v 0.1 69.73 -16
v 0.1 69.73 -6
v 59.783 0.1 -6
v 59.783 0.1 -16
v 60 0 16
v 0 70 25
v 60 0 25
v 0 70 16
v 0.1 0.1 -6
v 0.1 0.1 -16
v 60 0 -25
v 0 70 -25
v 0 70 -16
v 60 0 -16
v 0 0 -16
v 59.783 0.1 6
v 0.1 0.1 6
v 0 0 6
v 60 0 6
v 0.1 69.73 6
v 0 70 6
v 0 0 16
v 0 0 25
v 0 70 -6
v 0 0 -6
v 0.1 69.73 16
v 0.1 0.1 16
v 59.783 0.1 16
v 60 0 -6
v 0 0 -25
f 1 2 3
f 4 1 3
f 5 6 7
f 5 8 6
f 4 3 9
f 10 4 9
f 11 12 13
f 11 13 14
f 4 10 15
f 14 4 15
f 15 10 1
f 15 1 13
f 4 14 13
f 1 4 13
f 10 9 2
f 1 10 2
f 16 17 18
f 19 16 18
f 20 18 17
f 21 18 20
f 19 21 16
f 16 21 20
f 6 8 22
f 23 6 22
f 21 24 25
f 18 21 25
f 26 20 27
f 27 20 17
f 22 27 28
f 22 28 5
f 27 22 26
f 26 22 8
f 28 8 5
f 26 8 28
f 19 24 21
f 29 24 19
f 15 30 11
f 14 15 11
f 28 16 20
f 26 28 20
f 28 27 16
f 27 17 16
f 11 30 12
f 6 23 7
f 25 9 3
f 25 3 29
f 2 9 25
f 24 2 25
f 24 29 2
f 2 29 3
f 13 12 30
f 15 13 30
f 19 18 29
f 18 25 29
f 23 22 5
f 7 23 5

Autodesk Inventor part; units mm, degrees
ref_plane "YZ Plane" through (0, 0, 0) normal (1, 0, 0) x (0, 1, 0)
ref_plane "XZ Plane" through (0, 0, 0) normal (0, 1, 0) x (-1, 0, 0)
sketch "草圖1" plane through (0, 0, 0) normal (0, 0, 1) x (1, 0, 0)
  line L0 (-12, 0) -> (72, 0) construction
  line L1 (0, -14) -> (0, 84) construction
  line L2 (0, 0) -> (60, 0)
  line L3 (0, 70) -> (0, 0)
  line L4 (0, 70) -> (60, 0)
  dimension "d0" = 60
  dimension "d1" = 70
extrude "擠出1" add sketch "草圖1" along normal mid plane 50
ref_plane "工作平面1" through (0, 0, 2) normal (0, 0, 1) x (1, 0, 0)
ref_plane "工作平面2" through (0, 0, 6) normal (0, 0, 1) x (1, 0, 0)
sketch "草圖3" plane through (0, 0, 6) normal (0, 0, 1) x (1, 0, 0)
  line L0 (0, 0) -> (0, 70) construction
  line L1 (0, 70) -> (60, 0) construction
  line L2 (60, 0) -> (0, 0) projected
  line L3 (59.7826, 0.1) -> (0.1, 69.7297)
  line L4 (0.1, 69.7297) -> (0.1, 0.1)
  line L5 (0.1, 0.1) -> (59.7826, 0.1)
  line L6 (0, 0) -> (0, 70) projected
  line L7 (0, 70) -> (60, 0) projected
  line L8 (60, 0) -> (0, 0) projected
  dimension "d7" = 0.1
extrude "擠出2" cut sketch "草圖3" along normal blind 10
mirror "鏡射1" about plane through (0, 0, 0) normal (0, 0, 1) of "擠出2"
properties part number "三明治"
